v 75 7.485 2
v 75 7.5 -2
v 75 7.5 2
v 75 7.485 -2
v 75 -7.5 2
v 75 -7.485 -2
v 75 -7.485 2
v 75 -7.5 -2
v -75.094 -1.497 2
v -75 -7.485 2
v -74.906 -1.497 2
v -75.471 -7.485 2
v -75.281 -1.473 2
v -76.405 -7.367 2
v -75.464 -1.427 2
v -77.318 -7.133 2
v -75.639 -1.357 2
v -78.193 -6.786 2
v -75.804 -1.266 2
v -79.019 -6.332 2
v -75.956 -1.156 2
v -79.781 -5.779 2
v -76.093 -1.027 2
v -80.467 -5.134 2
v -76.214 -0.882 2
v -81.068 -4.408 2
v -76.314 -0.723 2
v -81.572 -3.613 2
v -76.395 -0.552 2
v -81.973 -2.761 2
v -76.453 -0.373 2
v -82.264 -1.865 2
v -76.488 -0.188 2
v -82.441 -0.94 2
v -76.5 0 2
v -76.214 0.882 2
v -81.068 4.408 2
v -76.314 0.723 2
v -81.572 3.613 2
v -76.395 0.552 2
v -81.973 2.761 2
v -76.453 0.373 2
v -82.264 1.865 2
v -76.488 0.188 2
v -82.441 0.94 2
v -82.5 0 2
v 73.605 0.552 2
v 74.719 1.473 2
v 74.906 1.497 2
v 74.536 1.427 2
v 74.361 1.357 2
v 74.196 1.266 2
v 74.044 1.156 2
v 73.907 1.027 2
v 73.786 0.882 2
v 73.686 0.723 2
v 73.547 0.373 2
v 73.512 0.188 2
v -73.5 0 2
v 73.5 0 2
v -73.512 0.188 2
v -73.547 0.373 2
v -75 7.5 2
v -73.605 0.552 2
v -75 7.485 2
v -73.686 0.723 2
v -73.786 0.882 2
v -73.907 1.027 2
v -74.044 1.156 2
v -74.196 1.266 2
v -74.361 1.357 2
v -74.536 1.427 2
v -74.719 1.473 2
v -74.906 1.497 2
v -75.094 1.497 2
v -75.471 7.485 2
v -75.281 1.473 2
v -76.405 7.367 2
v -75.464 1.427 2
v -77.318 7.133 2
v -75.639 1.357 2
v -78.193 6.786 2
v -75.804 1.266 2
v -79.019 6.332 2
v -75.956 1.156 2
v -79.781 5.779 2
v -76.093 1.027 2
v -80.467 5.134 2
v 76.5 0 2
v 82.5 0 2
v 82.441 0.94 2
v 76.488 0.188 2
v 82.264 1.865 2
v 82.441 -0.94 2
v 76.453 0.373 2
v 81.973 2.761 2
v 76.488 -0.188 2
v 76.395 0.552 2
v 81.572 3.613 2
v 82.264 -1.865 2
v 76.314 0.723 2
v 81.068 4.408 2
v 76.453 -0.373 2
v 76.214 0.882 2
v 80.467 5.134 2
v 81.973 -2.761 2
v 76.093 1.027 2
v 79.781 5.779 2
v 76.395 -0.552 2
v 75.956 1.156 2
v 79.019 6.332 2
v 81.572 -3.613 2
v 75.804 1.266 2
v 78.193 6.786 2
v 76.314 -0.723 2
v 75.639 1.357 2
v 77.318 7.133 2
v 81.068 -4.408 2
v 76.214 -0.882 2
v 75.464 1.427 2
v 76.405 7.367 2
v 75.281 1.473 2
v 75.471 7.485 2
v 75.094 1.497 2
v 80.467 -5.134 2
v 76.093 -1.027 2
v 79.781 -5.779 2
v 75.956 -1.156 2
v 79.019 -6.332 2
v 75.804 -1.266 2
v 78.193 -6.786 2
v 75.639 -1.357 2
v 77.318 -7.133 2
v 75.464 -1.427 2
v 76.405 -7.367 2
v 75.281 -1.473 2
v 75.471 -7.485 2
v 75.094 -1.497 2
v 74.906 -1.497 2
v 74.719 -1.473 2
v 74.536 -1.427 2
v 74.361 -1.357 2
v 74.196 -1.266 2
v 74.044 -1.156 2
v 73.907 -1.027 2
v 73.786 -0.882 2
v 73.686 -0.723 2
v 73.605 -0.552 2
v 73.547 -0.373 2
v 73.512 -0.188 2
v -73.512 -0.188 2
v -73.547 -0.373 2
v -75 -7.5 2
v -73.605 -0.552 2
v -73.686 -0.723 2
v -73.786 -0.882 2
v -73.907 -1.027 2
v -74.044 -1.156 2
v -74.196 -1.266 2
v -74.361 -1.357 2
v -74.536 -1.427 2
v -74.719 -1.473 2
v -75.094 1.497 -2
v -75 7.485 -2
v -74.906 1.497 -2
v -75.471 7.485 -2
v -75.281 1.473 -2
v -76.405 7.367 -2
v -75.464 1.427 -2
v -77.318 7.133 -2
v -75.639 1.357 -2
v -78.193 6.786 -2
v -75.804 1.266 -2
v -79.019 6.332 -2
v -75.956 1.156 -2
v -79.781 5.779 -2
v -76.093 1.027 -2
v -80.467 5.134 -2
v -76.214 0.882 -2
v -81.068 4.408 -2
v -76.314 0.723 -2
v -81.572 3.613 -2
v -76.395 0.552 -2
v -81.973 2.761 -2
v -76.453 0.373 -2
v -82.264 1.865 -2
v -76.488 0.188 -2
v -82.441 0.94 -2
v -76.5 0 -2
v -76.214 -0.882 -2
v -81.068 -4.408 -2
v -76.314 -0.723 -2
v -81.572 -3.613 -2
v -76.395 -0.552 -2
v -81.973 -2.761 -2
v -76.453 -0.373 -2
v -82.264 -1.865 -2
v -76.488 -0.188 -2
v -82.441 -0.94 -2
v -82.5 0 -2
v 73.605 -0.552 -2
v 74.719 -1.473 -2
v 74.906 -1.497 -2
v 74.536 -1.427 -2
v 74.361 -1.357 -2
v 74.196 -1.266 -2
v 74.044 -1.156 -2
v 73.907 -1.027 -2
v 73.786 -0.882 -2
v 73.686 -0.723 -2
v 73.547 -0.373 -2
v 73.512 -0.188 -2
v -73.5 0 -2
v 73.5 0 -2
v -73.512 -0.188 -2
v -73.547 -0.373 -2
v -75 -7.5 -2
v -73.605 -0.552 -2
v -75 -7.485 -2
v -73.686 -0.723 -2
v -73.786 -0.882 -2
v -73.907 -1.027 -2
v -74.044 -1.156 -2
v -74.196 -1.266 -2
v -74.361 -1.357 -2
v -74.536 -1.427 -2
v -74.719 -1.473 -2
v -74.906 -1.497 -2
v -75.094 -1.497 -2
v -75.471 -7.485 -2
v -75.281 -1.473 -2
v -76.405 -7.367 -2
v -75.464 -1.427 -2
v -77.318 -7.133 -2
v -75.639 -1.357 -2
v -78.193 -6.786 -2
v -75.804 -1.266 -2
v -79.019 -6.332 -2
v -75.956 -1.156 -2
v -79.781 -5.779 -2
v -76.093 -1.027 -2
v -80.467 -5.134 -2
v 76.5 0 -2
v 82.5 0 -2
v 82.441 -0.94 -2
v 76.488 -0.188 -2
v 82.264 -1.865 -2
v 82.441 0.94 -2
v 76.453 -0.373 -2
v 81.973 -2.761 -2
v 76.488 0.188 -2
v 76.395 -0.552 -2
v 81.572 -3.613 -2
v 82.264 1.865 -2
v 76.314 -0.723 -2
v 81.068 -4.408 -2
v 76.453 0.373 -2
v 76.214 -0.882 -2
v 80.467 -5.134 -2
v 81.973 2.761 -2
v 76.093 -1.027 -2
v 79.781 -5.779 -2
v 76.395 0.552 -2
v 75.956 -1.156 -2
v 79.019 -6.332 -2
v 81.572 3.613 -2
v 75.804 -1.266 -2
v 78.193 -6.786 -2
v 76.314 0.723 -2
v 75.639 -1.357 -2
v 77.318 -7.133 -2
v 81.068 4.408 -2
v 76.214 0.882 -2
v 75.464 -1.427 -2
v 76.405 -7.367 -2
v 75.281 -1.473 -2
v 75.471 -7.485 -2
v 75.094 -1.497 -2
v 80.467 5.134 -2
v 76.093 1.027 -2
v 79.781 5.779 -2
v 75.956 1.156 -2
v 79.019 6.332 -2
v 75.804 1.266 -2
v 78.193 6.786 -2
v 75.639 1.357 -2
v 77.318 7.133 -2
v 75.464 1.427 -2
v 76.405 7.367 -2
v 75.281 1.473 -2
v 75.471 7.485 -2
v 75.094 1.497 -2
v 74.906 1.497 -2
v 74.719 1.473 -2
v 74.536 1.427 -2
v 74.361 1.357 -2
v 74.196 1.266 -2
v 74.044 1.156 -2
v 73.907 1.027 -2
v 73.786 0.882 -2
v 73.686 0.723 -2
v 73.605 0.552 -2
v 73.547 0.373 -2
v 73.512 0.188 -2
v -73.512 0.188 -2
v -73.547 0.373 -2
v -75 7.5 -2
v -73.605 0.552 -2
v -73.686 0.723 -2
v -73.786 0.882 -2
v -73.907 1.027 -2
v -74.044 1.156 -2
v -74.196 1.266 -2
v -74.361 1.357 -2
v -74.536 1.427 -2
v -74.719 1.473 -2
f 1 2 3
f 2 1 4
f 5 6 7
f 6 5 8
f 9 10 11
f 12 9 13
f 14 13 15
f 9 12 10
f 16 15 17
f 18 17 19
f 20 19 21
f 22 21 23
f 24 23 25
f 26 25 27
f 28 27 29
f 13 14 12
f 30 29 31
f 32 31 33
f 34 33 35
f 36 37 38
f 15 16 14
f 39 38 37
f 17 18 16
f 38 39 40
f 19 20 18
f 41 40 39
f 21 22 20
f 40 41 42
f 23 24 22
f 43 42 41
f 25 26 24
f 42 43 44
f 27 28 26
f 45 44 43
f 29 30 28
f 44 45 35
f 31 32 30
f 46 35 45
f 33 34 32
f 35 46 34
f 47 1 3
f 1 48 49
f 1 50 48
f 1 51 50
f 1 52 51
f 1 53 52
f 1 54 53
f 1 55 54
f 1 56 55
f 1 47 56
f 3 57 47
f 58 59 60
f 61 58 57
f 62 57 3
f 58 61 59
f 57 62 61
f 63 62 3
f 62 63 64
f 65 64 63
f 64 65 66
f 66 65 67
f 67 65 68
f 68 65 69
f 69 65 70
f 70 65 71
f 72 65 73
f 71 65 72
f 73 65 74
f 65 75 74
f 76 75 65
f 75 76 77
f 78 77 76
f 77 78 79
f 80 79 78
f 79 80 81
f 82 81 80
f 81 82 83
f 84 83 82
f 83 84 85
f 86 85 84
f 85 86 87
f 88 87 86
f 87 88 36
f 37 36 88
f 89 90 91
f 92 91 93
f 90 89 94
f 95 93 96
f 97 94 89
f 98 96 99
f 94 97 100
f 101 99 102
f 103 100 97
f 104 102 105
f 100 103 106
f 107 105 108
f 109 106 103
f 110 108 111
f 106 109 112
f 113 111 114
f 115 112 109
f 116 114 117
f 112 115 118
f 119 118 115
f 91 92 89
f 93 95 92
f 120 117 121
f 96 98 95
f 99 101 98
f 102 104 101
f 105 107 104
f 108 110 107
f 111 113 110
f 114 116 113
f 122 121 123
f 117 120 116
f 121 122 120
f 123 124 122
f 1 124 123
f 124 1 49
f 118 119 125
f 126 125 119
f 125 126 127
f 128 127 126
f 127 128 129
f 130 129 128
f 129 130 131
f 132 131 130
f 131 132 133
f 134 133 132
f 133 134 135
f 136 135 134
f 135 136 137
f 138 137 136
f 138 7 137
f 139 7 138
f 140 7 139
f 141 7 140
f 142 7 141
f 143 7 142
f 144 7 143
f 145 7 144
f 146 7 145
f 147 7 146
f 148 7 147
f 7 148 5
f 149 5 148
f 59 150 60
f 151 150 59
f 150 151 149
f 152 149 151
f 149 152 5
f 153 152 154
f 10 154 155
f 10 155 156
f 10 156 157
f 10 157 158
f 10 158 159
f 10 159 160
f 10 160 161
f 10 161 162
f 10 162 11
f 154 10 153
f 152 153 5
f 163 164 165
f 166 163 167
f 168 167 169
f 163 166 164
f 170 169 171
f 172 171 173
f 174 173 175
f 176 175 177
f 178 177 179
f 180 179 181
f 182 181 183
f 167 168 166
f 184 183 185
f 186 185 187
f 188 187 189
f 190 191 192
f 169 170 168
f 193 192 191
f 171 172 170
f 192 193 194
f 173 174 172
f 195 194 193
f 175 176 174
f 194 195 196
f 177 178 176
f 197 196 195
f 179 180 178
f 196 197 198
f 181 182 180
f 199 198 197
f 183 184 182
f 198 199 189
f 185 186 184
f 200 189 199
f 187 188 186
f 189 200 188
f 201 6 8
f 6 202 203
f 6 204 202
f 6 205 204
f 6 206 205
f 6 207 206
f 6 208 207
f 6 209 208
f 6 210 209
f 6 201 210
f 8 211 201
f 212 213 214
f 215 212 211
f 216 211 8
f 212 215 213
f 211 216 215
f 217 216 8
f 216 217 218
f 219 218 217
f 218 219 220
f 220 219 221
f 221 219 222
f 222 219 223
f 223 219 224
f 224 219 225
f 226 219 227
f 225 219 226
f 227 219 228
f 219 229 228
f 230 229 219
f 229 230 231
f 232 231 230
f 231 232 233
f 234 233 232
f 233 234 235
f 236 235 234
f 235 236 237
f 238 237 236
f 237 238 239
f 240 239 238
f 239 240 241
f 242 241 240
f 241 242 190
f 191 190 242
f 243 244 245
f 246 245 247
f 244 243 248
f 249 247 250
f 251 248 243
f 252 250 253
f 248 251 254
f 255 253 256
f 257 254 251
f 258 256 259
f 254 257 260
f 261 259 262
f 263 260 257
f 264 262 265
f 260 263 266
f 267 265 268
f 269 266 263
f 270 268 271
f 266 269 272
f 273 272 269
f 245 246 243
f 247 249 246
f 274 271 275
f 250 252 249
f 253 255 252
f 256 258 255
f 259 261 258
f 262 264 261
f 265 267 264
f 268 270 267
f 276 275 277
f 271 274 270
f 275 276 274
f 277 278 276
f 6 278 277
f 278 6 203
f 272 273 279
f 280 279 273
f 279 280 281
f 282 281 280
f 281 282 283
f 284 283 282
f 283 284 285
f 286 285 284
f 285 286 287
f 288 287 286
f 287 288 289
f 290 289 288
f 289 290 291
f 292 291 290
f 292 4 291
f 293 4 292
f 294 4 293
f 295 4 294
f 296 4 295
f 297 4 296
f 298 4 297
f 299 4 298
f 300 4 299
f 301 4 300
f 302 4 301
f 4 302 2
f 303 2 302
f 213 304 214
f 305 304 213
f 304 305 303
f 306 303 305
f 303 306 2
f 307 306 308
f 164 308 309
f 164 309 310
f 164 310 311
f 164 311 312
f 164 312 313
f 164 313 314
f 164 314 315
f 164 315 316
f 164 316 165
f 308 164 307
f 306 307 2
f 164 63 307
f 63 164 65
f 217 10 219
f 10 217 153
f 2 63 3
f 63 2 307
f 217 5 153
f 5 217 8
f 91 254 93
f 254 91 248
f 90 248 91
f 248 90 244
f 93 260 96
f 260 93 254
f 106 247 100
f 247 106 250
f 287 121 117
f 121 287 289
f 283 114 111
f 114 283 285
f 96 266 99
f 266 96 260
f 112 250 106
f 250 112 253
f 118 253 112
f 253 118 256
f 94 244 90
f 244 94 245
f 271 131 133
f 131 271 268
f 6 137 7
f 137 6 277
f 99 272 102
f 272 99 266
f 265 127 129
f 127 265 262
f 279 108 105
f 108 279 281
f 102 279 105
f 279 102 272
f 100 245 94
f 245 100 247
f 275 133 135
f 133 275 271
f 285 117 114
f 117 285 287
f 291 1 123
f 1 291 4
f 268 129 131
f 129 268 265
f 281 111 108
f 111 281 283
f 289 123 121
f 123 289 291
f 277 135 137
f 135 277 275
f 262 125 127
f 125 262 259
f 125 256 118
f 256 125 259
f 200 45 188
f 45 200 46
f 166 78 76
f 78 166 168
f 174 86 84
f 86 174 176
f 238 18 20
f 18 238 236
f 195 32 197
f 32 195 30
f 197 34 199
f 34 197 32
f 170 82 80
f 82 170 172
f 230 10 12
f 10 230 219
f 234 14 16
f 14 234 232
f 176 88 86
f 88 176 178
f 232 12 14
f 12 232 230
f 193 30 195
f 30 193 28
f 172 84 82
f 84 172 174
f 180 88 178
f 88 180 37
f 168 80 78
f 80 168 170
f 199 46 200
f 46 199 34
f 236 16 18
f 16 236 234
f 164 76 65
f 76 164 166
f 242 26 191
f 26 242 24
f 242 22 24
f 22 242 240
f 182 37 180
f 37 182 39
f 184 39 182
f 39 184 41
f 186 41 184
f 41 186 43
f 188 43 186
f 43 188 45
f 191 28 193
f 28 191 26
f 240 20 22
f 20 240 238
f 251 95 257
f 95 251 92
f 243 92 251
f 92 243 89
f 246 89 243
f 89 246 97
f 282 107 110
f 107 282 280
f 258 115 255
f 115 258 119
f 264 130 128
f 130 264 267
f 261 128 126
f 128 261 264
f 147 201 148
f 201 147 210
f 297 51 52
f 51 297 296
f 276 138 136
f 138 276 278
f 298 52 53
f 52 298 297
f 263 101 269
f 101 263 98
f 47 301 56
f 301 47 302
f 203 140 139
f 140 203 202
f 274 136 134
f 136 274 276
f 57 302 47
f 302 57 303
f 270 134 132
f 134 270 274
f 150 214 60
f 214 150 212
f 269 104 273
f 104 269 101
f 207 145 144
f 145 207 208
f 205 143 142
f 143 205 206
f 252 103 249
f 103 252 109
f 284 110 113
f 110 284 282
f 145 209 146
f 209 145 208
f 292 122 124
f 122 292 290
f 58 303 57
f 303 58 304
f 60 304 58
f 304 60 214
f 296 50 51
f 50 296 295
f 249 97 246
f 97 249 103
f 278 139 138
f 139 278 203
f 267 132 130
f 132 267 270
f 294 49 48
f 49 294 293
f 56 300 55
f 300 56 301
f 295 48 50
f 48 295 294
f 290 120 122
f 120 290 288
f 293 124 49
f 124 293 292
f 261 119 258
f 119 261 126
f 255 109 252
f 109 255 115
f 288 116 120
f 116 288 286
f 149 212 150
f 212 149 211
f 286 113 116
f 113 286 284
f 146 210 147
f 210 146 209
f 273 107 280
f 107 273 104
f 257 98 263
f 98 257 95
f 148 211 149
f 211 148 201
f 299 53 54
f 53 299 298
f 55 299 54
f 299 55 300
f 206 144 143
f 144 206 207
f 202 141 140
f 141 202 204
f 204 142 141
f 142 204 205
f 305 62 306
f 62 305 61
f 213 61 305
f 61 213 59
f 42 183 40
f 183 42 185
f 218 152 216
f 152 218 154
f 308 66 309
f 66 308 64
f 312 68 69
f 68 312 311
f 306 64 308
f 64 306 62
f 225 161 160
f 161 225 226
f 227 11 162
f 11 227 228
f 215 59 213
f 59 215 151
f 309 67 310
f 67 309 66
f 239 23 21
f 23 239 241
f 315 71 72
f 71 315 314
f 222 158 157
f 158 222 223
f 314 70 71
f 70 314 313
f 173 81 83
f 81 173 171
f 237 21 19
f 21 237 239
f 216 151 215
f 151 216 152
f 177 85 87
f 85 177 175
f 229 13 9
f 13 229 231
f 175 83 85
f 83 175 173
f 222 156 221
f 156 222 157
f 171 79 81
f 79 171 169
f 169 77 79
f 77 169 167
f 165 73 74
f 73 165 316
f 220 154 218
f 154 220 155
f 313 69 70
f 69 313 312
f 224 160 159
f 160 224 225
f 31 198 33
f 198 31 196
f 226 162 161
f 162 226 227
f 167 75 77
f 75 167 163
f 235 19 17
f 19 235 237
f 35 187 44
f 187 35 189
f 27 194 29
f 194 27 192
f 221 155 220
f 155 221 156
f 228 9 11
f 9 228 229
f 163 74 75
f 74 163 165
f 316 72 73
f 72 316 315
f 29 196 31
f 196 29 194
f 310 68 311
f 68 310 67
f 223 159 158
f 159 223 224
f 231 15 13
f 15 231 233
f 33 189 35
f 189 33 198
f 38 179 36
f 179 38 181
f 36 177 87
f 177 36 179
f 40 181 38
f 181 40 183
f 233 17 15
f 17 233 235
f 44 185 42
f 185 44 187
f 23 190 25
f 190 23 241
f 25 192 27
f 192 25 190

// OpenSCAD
//Author: Piotr Paterek, Kraków 05-08.2016
$fn=50;
module cal()
{
cube([150,15,4], center=true);
translate([75,0,-2])
        {
            cylinder(r=7.5, h=4);
        }
translate([-75,0,-2])
        {
            cylinder(r=7.5, h=4);
        }
}

difference()
{
    difference()
    {
        cal();
        translate([75,0,-2])
        {
            cylinder(r=1.5, h=4);
        }
    }
    translate([-75,0,-2])
        {
            cylinder(r=1.5, h=4);
        }
}
